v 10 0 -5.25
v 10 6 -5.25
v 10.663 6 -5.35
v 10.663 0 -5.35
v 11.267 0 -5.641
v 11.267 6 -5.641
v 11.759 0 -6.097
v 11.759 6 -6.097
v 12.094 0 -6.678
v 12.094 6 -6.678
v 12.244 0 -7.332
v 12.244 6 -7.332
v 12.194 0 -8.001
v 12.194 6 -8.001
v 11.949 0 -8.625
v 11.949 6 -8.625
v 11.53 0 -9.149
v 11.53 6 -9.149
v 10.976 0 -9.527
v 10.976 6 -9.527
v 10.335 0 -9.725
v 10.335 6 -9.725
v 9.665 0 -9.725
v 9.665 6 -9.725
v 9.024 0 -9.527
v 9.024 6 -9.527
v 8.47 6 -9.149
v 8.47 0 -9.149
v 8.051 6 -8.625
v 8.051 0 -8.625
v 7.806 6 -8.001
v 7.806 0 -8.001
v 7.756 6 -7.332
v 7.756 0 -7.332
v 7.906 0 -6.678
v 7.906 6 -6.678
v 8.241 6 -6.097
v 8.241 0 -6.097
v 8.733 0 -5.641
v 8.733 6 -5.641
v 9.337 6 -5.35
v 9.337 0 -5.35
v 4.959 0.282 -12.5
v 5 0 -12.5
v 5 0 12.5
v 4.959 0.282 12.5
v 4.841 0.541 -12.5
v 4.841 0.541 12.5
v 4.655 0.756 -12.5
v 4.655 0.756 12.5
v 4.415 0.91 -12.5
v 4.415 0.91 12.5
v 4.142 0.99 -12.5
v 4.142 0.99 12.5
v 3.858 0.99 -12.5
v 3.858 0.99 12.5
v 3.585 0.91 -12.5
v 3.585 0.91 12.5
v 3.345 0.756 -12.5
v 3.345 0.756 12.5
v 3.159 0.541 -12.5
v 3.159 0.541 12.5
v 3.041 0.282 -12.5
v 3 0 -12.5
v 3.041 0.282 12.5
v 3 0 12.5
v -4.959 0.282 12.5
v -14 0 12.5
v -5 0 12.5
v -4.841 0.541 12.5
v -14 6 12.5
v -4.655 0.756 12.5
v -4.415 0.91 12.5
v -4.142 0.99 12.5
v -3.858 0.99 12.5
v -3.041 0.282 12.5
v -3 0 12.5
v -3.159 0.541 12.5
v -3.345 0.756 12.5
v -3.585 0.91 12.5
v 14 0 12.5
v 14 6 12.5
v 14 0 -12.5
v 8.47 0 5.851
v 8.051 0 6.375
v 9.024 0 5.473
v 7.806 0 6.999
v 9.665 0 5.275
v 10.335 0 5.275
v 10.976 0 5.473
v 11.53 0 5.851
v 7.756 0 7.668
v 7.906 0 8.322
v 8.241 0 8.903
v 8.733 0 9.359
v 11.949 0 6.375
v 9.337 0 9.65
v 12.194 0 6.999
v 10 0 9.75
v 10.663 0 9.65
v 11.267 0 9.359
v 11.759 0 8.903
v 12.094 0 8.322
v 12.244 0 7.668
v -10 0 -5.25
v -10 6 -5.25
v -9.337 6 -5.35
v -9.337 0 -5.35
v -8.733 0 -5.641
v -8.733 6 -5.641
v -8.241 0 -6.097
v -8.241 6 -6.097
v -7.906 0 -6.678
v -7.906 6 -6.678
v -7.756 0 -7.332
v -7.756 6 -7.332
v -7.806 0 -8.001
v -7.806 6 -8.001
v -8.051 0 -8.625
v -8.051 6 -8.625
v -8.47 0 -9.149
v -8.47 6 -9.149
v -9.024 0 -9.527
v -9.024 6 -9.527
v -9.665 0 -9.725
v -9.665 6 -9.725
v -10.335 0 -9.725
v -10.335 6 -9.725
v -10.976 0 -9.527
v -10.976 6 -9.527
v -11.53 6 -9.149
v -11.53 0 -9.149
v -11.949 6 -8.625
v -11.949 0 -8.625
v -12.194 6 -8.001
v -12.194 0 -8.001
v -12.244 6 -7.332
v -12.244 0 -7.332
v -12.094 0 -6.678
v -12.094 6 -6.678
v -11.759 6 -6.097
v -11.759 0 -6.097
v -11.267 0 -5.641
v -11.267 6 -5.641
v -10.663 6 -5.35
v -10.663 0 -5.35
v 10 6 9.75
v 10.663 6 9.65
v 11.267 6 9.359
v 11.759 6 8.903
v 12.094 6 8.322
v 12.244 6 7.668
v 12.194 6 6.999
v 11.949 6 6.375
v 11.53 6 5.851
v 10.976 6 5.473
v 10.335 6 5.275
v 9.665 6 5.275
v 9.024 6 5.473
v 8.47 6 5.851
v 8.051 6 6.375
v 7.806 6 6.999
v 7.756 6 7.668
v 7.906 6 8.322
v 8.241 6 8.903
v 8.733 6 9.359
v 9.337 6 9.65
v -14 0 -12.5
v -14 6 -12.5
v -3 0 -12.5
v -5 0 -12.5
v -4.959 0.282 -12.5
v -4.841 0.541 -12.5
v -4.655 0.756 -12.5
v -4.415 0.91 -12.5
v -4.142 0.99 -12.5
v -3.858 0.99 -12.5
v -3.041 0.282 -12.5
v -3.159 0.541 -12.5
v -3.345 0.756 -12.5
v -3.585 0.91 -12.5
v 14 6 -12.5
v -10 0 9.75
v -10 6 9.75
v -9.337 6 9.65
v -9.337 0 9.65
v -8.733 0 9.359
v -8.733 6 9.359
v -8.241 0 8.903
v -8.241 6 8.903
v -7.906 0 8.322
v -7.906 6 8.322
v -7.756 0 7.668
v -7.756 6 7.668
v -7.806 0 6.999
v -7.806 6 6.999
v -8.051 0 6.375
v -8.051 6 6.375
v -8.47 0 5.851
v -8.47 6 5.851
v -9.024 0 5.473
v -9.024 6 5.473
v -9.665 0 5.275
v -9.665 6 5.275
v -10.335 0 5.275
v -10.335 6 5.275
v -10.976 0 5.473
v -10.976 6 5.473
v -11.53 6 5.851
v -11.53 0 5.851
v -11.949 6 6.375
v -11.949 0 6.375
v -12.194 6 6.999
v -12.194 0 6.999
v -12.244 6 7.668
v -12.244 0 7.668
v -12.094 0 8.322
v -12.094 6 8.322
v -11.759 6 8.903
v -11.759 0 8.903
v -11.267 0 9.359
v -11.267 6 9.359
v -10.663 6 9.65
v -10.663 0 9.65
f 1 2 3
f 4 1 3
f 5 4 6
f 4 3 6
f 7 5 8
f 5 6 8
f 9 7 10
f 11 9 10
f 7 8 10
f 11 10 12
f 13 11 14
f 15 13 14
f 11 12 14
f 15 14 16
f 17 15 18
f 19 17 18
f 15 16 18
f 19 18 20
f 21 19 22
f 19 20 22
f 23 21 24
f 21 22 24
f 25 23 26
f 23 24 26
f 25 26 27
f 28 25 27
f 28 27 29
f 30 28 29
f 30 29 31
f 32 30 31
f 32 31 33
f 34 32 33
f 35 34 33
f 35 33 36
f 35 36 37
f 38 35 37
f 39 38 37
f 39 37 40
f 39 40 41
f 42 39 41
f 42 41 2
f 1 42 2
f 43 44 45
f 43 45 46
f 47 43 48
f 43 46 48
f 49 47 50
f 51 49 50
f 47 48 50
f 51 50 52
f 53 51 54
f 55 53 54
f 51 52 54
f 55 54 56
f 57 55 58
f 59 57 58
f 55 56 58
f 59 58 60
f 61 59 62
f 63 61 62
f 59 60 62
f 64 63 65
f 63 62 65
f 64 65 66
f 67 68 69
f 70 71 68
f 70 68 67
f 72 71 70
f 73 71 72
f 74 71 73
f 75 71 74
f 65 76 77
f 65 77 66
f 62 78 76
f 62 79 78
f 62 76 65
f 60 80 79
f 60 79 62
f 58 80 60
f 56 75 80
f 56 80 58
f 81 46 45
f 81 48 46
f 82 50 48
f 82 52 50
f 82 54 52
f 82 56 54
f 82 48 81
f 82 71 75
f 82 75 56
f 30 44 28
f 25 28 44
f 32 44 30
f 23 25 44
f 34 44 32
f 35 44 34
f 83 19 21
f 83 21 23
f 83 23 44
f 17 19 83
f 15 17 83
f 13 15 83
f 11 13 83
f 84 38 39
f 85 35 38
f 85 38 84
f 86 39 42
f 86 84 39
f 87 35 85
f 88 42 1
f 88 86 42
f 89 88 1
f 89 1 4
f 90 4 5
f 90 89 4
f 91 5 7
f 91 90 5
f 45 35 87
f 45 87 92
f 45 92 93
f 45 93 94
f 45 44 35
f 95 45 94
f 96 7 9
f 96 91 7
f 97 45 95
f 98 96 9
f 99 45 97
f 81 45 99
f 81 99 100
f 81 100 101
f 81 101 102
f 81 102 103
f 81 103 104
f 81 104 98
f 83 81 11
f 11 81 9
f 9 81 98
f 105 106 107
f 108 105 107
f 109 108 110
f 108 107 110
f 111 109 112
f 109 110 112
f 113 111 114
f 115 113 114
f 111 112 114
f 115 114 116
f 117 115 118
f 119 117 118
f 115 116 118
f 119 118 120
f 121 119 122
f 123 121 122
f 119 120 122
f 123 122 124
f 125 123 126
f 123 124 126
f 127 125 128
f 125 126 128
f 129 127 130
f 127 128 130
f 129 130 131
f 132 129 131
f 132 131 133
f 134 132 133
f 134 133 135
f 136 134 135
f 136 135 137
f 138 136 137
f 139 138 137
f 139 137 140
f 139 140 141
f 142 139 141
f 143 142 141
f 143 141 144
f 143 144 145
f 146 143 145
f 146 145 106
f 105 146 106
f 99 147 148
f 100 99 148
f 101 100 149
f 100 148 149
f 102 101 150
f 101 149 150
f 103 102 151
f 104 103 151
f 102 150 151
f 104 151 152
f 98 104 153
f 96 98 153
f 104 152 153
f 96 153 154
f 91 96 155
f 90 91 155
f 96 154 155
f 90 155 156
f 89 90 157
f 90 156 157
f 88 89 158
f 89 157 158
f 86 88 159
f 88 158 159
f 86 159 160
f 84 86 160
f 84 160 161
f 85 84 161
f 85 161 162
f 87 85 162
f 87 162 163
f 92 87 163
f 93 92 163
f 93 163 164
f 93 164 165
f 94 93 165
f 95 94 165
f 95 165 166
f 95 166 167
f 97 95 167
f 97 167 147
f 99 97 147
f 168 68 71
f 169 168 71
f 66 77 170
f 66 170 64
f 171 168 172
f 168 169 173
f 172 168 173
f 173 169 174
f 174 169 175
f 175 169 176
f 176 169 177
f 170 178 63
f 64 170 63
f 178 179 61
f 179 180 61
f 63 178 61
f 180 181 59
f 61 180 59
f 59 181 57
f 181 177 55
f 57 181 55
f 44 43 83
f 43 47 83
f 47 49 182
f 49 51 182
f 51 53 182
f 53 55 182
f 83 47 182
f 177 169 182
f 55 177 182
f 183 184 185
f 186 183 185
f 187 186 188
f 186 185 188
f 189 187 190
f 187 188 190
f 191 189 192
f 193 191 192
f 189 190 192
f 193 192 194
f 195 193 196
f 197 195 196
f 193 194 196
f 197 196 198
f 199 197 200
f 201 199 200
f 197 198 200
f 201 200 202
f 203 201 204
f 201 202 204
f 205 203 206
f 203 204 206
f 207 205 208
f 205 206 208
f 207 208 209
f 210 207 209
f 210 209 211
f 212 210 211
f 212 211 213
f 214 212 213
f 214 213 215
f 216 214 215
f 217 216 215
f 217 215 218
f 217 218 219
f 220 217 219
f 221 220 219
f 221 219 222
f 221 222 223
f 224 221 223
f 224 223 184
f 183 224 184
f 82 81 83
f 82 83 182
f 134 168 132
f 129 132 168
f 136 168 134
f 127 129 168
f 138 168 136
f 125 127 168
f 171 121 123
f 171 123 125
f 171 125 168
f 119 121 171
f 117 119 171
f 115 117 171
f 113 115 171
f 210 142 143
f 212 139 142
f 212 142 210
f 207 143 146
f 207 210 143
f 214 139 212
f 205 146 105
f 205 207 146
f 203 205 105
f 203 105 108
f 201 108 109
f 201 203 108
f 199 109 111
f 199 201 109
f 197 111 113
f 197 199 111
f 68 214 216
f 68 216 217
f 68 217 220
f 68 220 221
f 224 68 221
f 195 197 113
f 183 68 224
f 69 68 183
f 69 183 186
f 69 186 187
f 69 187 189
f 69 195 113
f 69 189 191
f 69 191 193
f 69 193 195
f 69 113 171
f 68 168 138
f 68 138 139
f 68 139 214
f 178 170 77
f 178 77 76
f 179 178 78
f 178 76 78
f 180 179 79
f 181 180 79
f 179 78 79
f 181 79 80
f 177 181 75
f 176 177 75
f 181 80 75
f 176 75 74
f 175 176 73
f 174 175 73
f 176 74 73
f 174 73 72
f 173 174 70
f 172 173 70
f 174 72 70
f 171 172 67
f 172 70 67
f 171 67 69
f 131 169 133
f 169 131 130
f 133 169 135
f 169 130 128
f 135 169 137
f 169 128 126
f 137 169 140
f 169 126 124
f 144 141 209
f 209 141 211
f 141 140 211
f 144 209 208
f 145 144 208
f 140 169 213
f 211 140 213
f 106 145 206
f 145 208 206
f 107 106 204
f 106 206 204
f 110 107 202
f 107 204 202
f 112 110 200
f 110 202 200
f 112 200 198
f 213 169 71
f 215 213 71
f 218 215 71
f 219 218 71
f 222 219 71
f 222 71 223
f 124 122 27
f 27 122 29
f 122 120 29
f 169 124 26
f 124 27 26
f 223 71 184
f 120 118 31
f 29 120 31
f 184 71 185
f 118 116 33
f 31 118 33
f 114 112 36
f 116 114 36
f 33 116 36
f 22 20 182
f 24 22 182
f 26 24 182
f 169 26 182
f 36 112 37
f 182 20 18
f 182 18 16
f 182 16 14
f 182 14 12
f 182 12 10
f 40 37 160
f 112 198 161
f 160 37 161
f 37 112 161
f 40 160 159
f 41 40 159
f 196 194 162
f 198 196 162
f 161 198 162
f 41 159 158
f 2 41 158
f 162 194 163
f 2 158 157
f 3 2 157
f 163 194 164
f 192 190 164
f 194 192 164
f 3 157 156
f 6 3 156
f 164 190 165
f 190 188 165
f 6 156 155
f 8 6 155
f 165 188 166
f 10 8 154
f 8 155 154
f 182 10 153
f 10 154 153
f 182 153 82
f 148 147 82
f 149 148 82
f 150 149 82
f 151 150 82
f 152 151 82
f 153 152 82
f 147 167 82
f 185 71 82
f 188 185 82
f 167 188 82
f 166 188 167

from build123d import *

# Parameters (mm, degrees)
SKETCH1_W           = 28
SKETCH1_H           = 6
BOSS_EXTRUDE1_DEPTH = 12.5
SKETCH2_R           = 1
CUT_EXTRUDE1_DEPTH  = 435
SKETCH3_R           = 2.25
CUT_EXTRUDE2_DEPTH  = 20.704060495


with BuildPart() as part:
    # Sketch1 → Boss-Extrude1 (new, symmetric)
    with BuildSketch(Plane.XY):
        with Locations((0, 3)):
            Rectangle(SKETCH1_W, SKETCH1_H)
    extrude(amount=BOSS_EXTRUDE1_DEPTH, both=True)

    # Sketch2 → Cut-Extrude1 (cut)
    with BuildSketch(Plane.XY.offset(12.5)):
        with Locations((-4, 0)):
            Circle(SKETCH2_R)
        with Locations((4, 0)):
            Circle(SKETCH2_R)
    extrude(amount=-CUT_EXTRUDE1_DEPTH, mode=Mode.SUBTRACT)

    # Sketch3 → Cut-Extrude2 (cut, through all)
    with BuildSketch(Plane(origin=(0, 6, 0), x_dir=(1, 0, 0), z_dir=(0, 1, 0))):
        with Locations(Location((-10, 7.5, 0), (0, 0, 270))):
            Circle(SKETCH3_R)
        with Locations(Location((-10, -7.5, 0), (0, 0, 270))):
            Circle(SKETCH3_R)
        with Locations(Location((10, -7.5, 0), (0, 0, 270))):
            Circle(SKETCH3_R)
        with Locations(Location((10, 7.5, 0), (0, 0, 270))):
            Circle(SKETCH3_R)
    extrude(amount=-CUT_EXTRUDE2_DEPTH, mode=Mode.SUBTRACT)


solid = part.part
